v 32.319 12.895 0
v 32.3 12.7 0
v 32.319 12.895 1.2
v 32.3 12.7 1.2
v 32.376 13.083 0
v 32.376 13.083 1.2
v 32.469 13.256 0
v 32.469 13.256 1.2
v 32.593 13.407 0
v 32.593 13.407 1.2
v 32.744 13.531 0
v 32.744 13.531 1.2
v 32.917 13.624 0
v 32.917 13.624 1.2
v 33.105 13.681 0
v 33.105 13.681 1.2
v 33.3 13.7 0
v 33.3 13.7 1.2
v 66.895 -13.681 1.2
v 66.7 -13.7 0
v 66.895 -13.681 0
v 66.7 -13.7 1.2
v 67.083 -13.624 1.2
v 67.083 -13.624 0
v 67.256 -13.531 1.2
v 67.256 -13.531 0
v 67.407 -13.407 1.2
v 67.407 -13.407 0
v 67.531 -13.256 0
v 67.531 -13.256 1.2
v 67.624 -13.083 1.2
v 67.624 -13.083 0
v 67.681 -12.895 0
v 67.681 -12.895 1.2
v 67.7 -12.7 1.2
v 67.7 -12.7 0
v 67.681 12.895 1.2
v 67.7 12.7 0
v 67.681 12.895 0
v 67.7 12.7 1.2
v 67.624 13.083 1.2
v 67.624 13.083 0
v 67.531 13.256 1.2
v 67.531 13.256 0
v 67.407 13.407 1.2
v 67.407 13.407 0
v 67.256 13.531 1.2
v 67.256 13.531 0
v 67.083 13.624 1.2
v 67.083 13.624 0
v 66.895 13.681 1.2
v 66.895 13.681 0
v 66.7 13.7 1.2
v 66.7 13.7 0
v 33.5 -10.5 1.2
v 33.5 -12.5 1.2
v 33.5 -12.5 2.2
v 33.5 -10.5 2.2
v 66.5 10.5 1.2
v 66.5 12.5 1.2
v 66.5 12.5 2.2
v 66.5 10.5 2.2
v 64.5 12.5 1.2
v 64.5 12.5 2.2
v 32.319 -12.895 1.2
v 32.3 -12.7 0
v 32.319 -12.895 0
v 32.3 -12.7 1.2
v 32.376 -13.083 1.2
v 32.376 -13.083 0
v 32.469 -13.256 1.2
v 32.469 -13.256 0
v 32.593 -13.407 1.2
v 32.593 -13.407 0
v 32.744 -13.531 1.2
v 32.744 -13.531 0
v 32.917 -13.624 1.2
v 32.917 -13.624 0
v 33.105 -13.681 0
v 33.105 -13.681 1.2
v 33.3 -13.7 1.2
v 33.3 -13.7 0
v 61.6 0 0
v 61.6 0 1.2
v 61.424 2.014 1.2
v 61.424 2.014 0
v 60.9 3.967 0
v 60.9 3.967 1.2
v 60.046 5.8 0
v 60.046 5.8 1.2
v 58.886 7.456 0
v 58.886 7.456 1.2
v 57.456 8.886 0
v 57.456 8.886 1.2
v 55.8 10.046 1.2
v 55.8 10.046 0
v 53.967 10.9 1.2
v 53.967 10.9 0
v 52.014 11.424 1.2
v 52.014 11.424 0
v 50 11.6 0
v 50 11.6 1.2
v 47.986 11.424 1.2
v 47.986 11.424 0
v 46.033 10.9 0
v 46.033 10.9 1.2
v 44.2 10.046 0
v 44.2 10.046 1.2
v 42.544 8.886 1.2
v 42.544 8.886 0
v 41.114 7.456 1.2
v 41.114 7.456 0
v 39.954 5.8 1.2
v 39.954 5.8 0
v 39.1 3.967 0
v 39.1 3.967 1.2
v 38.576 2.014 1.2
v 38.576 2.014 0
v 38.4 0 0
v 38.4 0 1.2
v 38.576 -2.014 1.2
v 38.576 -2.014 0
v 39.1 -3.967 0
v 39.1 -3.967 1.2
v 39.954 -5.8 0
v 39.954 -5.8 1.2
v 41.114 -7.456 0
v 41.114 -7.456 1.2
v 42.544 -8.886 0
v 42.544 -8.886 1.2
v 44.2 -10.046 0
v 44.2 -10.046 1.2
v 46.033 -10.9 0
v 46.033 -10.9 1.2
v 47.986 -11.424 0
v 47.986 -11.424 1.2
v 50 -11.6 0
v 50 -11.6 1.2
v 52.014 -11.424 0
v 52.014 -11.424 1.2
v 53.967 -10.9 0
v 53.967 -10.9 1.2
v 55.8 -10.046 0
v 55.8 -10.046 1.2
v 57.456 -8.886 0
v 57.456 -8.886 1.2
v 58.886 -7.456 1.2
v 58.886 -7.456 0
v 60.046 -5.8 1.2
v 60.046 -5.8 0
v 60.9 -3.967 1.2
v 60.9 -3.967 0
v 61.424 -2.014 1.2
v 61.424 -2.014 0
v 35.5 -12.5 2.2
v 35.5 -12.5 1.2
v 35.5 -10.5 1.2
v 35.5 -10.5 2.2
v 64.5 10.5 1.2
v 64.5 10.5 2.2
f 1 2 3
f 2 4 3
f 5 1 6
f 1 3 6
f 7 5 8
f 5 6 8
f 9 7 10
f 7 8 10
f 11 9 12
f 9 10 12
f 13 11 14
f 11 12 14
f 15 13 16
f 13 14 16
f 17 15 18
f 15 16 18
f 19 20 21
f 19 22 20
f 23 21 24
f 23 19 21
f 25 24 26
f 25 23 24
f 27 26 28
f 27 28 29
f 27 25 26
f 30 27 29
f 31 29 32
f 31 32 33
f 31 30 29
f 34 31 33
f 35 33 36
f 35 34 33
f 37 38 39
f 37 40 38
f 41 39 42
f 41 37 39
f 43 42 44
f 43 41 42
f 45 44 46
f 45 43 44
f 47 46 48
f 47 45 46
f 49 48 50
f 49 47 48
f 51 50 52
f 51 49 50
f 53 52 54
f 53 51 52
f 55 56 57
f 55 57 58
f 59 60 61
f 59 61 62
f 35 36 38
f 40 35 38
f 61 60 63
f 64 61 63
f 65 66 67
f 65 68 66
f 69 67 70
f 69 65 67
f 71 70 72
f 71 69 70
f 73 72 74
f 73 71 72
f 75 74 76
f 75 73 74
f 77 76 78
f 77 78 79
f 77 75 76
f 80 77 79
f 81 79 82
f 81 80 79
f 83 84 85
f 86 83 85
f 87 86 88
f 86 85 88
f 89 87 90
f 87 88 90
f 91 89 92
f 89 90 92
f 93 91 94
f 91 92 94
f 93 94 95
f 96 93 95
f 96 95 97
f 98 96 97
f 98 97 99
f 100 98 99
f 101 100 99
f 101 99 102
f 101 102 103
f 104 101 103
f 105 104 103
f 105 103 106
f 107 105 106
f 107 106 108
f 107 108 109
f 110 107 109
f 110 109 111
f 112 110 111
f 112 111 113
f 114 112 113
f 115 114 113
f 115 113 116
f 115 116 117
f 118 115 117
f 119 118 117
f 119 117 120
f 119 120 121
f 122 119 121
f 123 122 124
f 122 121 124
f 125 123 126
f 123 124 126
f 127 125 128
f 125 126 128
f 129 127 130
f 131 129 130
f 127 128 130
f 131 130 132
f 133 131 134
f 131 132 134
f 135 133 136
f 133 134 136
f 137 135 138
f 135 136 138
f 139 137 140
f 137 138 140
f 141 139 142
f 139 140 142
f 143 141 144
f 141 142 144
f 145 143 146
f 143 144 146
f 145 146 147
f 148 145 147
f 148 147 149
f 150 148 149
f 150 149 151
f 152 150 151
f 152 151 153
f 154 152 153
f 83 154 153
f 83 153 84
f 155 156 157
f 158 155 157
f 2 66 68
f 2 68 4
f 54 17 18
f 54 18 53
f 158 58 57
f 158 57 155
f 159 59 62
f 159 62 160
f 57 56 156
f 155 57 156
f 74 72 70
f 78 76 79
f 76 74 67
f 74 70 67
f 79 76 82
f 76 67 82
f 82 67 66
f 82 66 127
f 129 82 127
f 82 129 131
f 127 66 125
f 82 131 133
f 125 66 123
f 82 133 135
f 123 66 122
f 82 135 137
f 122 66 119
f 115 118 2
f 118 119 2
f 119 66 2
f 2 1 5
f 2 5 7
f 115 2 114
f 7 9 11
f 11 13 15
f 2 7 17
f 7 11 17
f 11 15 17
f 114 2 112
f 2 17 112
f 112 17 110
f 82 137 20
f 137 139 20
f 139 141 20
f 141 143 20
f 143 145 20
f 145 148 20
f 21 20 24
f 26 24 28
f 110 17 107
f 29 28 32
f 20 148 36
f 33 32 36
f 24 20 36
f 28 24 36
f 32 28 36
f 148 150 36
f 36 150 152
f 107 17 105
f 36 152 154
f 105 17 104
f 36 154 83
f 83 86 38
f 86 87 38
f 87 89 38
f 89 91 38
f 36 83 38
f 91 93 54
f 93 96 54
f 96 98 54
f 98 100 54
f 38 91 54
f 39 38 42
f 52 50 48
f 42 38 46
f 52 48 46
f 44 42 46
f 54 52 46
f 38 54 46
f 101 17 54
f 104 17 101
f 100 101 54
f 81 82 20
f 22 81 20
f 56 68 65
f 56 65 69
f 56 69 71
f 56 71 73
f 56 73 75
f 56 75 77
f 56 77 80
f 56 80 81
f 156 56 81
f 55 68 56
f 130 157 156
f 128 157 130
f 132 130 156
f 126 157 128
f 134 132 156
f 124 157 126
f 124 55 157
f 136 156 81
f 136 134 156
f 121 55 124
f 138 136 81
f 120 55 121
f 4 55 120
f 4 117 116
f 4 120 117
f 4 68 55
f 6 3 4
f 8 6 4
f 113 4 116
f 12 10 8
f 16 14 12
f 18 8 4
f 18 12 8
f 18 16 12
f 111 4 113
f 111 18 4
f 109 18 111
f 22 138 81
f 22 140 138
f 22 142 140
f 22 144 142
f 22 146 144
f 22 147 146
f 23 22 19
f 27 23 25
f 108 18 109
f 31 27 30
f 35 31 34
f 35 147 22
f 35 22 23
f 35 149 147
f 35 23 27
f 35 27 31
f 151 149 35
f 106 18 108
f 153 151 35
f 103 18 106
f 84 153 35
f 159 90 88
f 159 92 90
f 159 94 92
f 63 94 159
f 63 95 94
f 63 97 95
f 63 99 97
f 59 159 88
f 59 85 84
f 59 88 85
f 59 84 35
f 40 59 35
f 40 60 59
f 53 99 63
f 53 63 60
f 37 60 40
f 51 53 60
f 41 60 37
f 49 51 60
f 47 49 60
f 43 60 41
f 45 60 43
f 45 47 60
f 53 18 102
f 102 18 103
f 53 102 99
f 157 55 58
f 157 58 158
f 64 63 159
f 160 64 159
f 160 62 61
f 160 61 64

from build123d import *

# Parameters (mm, degrees)
SKETCH007_W        = 35.4
SKETCH007_H        = 27.4
PAD002_DEPTH       = 1.2
FILLET001_R        = 1
SKETCH008_R        = 11.6
POCKET003_DEPTH    = 1.201
SKETCH009_W        = 2
SKETCH009_H        = 2
PAD003_DEPTH       = 1
POLARPATTERN_COUNT = 2


with BuildPart() as part:
    # Sketch007 → Pad002 (new body)
    with BuildSketch(Plane.XY):
        Rectangle(SKETCH007_W, SKETCH007_H)
    extrude(amount=PAD002_DEPTH)

    # Fillet001
    fillet001_edges = [part.edges().sort_by_distance(p)[0] for p in [
        (-17.7, -13.7, 0.6),
        (17.7, -13.7, 0.6),
        (17.7, 13.7, 0.6),
        (-17.7, 13.7, 0.6),
    ]]
    fillet(fillet001_edges, radius=FILLET001_R)

    # Sketch008 (on Face5 of Fillet001) → Pocket003 (cut, through all)
    with BuildSketch(Plane.XY.offset(1.2)):
        Circle(SKETCH008_R)
    extrude(amount=-POCKET003_DEPTH, mode=Mode.SUBTRACT)

    # Sketch009 (on Face5 of Pocket003) → Pad003 (join)
    with BuildSketch(Plane.XY.offset(1.2)):
        with Locations((-15.5, -11.5)):
            Rectangle(SKETCH009_W, SKETCH009_H)
    pad003 = extrude(amount=PAD003_DEPTH)

    # PolarPattern: Pad003 ×2 about axis
    polarpattern_axis = Axis((0, 0, 1.2), (0, 0, 1))
    for i in range(1, POLARPATTERN_COUNT):
        add(pad003.rotate(polarpattern_axis, i * 360 / POLARPATTERN_COUNT))


with BuildPart() as part_1:
    # Body002 placement: moved
    add(part.part.moved(Location((50, 0, 0))))


solid = part_1.part
